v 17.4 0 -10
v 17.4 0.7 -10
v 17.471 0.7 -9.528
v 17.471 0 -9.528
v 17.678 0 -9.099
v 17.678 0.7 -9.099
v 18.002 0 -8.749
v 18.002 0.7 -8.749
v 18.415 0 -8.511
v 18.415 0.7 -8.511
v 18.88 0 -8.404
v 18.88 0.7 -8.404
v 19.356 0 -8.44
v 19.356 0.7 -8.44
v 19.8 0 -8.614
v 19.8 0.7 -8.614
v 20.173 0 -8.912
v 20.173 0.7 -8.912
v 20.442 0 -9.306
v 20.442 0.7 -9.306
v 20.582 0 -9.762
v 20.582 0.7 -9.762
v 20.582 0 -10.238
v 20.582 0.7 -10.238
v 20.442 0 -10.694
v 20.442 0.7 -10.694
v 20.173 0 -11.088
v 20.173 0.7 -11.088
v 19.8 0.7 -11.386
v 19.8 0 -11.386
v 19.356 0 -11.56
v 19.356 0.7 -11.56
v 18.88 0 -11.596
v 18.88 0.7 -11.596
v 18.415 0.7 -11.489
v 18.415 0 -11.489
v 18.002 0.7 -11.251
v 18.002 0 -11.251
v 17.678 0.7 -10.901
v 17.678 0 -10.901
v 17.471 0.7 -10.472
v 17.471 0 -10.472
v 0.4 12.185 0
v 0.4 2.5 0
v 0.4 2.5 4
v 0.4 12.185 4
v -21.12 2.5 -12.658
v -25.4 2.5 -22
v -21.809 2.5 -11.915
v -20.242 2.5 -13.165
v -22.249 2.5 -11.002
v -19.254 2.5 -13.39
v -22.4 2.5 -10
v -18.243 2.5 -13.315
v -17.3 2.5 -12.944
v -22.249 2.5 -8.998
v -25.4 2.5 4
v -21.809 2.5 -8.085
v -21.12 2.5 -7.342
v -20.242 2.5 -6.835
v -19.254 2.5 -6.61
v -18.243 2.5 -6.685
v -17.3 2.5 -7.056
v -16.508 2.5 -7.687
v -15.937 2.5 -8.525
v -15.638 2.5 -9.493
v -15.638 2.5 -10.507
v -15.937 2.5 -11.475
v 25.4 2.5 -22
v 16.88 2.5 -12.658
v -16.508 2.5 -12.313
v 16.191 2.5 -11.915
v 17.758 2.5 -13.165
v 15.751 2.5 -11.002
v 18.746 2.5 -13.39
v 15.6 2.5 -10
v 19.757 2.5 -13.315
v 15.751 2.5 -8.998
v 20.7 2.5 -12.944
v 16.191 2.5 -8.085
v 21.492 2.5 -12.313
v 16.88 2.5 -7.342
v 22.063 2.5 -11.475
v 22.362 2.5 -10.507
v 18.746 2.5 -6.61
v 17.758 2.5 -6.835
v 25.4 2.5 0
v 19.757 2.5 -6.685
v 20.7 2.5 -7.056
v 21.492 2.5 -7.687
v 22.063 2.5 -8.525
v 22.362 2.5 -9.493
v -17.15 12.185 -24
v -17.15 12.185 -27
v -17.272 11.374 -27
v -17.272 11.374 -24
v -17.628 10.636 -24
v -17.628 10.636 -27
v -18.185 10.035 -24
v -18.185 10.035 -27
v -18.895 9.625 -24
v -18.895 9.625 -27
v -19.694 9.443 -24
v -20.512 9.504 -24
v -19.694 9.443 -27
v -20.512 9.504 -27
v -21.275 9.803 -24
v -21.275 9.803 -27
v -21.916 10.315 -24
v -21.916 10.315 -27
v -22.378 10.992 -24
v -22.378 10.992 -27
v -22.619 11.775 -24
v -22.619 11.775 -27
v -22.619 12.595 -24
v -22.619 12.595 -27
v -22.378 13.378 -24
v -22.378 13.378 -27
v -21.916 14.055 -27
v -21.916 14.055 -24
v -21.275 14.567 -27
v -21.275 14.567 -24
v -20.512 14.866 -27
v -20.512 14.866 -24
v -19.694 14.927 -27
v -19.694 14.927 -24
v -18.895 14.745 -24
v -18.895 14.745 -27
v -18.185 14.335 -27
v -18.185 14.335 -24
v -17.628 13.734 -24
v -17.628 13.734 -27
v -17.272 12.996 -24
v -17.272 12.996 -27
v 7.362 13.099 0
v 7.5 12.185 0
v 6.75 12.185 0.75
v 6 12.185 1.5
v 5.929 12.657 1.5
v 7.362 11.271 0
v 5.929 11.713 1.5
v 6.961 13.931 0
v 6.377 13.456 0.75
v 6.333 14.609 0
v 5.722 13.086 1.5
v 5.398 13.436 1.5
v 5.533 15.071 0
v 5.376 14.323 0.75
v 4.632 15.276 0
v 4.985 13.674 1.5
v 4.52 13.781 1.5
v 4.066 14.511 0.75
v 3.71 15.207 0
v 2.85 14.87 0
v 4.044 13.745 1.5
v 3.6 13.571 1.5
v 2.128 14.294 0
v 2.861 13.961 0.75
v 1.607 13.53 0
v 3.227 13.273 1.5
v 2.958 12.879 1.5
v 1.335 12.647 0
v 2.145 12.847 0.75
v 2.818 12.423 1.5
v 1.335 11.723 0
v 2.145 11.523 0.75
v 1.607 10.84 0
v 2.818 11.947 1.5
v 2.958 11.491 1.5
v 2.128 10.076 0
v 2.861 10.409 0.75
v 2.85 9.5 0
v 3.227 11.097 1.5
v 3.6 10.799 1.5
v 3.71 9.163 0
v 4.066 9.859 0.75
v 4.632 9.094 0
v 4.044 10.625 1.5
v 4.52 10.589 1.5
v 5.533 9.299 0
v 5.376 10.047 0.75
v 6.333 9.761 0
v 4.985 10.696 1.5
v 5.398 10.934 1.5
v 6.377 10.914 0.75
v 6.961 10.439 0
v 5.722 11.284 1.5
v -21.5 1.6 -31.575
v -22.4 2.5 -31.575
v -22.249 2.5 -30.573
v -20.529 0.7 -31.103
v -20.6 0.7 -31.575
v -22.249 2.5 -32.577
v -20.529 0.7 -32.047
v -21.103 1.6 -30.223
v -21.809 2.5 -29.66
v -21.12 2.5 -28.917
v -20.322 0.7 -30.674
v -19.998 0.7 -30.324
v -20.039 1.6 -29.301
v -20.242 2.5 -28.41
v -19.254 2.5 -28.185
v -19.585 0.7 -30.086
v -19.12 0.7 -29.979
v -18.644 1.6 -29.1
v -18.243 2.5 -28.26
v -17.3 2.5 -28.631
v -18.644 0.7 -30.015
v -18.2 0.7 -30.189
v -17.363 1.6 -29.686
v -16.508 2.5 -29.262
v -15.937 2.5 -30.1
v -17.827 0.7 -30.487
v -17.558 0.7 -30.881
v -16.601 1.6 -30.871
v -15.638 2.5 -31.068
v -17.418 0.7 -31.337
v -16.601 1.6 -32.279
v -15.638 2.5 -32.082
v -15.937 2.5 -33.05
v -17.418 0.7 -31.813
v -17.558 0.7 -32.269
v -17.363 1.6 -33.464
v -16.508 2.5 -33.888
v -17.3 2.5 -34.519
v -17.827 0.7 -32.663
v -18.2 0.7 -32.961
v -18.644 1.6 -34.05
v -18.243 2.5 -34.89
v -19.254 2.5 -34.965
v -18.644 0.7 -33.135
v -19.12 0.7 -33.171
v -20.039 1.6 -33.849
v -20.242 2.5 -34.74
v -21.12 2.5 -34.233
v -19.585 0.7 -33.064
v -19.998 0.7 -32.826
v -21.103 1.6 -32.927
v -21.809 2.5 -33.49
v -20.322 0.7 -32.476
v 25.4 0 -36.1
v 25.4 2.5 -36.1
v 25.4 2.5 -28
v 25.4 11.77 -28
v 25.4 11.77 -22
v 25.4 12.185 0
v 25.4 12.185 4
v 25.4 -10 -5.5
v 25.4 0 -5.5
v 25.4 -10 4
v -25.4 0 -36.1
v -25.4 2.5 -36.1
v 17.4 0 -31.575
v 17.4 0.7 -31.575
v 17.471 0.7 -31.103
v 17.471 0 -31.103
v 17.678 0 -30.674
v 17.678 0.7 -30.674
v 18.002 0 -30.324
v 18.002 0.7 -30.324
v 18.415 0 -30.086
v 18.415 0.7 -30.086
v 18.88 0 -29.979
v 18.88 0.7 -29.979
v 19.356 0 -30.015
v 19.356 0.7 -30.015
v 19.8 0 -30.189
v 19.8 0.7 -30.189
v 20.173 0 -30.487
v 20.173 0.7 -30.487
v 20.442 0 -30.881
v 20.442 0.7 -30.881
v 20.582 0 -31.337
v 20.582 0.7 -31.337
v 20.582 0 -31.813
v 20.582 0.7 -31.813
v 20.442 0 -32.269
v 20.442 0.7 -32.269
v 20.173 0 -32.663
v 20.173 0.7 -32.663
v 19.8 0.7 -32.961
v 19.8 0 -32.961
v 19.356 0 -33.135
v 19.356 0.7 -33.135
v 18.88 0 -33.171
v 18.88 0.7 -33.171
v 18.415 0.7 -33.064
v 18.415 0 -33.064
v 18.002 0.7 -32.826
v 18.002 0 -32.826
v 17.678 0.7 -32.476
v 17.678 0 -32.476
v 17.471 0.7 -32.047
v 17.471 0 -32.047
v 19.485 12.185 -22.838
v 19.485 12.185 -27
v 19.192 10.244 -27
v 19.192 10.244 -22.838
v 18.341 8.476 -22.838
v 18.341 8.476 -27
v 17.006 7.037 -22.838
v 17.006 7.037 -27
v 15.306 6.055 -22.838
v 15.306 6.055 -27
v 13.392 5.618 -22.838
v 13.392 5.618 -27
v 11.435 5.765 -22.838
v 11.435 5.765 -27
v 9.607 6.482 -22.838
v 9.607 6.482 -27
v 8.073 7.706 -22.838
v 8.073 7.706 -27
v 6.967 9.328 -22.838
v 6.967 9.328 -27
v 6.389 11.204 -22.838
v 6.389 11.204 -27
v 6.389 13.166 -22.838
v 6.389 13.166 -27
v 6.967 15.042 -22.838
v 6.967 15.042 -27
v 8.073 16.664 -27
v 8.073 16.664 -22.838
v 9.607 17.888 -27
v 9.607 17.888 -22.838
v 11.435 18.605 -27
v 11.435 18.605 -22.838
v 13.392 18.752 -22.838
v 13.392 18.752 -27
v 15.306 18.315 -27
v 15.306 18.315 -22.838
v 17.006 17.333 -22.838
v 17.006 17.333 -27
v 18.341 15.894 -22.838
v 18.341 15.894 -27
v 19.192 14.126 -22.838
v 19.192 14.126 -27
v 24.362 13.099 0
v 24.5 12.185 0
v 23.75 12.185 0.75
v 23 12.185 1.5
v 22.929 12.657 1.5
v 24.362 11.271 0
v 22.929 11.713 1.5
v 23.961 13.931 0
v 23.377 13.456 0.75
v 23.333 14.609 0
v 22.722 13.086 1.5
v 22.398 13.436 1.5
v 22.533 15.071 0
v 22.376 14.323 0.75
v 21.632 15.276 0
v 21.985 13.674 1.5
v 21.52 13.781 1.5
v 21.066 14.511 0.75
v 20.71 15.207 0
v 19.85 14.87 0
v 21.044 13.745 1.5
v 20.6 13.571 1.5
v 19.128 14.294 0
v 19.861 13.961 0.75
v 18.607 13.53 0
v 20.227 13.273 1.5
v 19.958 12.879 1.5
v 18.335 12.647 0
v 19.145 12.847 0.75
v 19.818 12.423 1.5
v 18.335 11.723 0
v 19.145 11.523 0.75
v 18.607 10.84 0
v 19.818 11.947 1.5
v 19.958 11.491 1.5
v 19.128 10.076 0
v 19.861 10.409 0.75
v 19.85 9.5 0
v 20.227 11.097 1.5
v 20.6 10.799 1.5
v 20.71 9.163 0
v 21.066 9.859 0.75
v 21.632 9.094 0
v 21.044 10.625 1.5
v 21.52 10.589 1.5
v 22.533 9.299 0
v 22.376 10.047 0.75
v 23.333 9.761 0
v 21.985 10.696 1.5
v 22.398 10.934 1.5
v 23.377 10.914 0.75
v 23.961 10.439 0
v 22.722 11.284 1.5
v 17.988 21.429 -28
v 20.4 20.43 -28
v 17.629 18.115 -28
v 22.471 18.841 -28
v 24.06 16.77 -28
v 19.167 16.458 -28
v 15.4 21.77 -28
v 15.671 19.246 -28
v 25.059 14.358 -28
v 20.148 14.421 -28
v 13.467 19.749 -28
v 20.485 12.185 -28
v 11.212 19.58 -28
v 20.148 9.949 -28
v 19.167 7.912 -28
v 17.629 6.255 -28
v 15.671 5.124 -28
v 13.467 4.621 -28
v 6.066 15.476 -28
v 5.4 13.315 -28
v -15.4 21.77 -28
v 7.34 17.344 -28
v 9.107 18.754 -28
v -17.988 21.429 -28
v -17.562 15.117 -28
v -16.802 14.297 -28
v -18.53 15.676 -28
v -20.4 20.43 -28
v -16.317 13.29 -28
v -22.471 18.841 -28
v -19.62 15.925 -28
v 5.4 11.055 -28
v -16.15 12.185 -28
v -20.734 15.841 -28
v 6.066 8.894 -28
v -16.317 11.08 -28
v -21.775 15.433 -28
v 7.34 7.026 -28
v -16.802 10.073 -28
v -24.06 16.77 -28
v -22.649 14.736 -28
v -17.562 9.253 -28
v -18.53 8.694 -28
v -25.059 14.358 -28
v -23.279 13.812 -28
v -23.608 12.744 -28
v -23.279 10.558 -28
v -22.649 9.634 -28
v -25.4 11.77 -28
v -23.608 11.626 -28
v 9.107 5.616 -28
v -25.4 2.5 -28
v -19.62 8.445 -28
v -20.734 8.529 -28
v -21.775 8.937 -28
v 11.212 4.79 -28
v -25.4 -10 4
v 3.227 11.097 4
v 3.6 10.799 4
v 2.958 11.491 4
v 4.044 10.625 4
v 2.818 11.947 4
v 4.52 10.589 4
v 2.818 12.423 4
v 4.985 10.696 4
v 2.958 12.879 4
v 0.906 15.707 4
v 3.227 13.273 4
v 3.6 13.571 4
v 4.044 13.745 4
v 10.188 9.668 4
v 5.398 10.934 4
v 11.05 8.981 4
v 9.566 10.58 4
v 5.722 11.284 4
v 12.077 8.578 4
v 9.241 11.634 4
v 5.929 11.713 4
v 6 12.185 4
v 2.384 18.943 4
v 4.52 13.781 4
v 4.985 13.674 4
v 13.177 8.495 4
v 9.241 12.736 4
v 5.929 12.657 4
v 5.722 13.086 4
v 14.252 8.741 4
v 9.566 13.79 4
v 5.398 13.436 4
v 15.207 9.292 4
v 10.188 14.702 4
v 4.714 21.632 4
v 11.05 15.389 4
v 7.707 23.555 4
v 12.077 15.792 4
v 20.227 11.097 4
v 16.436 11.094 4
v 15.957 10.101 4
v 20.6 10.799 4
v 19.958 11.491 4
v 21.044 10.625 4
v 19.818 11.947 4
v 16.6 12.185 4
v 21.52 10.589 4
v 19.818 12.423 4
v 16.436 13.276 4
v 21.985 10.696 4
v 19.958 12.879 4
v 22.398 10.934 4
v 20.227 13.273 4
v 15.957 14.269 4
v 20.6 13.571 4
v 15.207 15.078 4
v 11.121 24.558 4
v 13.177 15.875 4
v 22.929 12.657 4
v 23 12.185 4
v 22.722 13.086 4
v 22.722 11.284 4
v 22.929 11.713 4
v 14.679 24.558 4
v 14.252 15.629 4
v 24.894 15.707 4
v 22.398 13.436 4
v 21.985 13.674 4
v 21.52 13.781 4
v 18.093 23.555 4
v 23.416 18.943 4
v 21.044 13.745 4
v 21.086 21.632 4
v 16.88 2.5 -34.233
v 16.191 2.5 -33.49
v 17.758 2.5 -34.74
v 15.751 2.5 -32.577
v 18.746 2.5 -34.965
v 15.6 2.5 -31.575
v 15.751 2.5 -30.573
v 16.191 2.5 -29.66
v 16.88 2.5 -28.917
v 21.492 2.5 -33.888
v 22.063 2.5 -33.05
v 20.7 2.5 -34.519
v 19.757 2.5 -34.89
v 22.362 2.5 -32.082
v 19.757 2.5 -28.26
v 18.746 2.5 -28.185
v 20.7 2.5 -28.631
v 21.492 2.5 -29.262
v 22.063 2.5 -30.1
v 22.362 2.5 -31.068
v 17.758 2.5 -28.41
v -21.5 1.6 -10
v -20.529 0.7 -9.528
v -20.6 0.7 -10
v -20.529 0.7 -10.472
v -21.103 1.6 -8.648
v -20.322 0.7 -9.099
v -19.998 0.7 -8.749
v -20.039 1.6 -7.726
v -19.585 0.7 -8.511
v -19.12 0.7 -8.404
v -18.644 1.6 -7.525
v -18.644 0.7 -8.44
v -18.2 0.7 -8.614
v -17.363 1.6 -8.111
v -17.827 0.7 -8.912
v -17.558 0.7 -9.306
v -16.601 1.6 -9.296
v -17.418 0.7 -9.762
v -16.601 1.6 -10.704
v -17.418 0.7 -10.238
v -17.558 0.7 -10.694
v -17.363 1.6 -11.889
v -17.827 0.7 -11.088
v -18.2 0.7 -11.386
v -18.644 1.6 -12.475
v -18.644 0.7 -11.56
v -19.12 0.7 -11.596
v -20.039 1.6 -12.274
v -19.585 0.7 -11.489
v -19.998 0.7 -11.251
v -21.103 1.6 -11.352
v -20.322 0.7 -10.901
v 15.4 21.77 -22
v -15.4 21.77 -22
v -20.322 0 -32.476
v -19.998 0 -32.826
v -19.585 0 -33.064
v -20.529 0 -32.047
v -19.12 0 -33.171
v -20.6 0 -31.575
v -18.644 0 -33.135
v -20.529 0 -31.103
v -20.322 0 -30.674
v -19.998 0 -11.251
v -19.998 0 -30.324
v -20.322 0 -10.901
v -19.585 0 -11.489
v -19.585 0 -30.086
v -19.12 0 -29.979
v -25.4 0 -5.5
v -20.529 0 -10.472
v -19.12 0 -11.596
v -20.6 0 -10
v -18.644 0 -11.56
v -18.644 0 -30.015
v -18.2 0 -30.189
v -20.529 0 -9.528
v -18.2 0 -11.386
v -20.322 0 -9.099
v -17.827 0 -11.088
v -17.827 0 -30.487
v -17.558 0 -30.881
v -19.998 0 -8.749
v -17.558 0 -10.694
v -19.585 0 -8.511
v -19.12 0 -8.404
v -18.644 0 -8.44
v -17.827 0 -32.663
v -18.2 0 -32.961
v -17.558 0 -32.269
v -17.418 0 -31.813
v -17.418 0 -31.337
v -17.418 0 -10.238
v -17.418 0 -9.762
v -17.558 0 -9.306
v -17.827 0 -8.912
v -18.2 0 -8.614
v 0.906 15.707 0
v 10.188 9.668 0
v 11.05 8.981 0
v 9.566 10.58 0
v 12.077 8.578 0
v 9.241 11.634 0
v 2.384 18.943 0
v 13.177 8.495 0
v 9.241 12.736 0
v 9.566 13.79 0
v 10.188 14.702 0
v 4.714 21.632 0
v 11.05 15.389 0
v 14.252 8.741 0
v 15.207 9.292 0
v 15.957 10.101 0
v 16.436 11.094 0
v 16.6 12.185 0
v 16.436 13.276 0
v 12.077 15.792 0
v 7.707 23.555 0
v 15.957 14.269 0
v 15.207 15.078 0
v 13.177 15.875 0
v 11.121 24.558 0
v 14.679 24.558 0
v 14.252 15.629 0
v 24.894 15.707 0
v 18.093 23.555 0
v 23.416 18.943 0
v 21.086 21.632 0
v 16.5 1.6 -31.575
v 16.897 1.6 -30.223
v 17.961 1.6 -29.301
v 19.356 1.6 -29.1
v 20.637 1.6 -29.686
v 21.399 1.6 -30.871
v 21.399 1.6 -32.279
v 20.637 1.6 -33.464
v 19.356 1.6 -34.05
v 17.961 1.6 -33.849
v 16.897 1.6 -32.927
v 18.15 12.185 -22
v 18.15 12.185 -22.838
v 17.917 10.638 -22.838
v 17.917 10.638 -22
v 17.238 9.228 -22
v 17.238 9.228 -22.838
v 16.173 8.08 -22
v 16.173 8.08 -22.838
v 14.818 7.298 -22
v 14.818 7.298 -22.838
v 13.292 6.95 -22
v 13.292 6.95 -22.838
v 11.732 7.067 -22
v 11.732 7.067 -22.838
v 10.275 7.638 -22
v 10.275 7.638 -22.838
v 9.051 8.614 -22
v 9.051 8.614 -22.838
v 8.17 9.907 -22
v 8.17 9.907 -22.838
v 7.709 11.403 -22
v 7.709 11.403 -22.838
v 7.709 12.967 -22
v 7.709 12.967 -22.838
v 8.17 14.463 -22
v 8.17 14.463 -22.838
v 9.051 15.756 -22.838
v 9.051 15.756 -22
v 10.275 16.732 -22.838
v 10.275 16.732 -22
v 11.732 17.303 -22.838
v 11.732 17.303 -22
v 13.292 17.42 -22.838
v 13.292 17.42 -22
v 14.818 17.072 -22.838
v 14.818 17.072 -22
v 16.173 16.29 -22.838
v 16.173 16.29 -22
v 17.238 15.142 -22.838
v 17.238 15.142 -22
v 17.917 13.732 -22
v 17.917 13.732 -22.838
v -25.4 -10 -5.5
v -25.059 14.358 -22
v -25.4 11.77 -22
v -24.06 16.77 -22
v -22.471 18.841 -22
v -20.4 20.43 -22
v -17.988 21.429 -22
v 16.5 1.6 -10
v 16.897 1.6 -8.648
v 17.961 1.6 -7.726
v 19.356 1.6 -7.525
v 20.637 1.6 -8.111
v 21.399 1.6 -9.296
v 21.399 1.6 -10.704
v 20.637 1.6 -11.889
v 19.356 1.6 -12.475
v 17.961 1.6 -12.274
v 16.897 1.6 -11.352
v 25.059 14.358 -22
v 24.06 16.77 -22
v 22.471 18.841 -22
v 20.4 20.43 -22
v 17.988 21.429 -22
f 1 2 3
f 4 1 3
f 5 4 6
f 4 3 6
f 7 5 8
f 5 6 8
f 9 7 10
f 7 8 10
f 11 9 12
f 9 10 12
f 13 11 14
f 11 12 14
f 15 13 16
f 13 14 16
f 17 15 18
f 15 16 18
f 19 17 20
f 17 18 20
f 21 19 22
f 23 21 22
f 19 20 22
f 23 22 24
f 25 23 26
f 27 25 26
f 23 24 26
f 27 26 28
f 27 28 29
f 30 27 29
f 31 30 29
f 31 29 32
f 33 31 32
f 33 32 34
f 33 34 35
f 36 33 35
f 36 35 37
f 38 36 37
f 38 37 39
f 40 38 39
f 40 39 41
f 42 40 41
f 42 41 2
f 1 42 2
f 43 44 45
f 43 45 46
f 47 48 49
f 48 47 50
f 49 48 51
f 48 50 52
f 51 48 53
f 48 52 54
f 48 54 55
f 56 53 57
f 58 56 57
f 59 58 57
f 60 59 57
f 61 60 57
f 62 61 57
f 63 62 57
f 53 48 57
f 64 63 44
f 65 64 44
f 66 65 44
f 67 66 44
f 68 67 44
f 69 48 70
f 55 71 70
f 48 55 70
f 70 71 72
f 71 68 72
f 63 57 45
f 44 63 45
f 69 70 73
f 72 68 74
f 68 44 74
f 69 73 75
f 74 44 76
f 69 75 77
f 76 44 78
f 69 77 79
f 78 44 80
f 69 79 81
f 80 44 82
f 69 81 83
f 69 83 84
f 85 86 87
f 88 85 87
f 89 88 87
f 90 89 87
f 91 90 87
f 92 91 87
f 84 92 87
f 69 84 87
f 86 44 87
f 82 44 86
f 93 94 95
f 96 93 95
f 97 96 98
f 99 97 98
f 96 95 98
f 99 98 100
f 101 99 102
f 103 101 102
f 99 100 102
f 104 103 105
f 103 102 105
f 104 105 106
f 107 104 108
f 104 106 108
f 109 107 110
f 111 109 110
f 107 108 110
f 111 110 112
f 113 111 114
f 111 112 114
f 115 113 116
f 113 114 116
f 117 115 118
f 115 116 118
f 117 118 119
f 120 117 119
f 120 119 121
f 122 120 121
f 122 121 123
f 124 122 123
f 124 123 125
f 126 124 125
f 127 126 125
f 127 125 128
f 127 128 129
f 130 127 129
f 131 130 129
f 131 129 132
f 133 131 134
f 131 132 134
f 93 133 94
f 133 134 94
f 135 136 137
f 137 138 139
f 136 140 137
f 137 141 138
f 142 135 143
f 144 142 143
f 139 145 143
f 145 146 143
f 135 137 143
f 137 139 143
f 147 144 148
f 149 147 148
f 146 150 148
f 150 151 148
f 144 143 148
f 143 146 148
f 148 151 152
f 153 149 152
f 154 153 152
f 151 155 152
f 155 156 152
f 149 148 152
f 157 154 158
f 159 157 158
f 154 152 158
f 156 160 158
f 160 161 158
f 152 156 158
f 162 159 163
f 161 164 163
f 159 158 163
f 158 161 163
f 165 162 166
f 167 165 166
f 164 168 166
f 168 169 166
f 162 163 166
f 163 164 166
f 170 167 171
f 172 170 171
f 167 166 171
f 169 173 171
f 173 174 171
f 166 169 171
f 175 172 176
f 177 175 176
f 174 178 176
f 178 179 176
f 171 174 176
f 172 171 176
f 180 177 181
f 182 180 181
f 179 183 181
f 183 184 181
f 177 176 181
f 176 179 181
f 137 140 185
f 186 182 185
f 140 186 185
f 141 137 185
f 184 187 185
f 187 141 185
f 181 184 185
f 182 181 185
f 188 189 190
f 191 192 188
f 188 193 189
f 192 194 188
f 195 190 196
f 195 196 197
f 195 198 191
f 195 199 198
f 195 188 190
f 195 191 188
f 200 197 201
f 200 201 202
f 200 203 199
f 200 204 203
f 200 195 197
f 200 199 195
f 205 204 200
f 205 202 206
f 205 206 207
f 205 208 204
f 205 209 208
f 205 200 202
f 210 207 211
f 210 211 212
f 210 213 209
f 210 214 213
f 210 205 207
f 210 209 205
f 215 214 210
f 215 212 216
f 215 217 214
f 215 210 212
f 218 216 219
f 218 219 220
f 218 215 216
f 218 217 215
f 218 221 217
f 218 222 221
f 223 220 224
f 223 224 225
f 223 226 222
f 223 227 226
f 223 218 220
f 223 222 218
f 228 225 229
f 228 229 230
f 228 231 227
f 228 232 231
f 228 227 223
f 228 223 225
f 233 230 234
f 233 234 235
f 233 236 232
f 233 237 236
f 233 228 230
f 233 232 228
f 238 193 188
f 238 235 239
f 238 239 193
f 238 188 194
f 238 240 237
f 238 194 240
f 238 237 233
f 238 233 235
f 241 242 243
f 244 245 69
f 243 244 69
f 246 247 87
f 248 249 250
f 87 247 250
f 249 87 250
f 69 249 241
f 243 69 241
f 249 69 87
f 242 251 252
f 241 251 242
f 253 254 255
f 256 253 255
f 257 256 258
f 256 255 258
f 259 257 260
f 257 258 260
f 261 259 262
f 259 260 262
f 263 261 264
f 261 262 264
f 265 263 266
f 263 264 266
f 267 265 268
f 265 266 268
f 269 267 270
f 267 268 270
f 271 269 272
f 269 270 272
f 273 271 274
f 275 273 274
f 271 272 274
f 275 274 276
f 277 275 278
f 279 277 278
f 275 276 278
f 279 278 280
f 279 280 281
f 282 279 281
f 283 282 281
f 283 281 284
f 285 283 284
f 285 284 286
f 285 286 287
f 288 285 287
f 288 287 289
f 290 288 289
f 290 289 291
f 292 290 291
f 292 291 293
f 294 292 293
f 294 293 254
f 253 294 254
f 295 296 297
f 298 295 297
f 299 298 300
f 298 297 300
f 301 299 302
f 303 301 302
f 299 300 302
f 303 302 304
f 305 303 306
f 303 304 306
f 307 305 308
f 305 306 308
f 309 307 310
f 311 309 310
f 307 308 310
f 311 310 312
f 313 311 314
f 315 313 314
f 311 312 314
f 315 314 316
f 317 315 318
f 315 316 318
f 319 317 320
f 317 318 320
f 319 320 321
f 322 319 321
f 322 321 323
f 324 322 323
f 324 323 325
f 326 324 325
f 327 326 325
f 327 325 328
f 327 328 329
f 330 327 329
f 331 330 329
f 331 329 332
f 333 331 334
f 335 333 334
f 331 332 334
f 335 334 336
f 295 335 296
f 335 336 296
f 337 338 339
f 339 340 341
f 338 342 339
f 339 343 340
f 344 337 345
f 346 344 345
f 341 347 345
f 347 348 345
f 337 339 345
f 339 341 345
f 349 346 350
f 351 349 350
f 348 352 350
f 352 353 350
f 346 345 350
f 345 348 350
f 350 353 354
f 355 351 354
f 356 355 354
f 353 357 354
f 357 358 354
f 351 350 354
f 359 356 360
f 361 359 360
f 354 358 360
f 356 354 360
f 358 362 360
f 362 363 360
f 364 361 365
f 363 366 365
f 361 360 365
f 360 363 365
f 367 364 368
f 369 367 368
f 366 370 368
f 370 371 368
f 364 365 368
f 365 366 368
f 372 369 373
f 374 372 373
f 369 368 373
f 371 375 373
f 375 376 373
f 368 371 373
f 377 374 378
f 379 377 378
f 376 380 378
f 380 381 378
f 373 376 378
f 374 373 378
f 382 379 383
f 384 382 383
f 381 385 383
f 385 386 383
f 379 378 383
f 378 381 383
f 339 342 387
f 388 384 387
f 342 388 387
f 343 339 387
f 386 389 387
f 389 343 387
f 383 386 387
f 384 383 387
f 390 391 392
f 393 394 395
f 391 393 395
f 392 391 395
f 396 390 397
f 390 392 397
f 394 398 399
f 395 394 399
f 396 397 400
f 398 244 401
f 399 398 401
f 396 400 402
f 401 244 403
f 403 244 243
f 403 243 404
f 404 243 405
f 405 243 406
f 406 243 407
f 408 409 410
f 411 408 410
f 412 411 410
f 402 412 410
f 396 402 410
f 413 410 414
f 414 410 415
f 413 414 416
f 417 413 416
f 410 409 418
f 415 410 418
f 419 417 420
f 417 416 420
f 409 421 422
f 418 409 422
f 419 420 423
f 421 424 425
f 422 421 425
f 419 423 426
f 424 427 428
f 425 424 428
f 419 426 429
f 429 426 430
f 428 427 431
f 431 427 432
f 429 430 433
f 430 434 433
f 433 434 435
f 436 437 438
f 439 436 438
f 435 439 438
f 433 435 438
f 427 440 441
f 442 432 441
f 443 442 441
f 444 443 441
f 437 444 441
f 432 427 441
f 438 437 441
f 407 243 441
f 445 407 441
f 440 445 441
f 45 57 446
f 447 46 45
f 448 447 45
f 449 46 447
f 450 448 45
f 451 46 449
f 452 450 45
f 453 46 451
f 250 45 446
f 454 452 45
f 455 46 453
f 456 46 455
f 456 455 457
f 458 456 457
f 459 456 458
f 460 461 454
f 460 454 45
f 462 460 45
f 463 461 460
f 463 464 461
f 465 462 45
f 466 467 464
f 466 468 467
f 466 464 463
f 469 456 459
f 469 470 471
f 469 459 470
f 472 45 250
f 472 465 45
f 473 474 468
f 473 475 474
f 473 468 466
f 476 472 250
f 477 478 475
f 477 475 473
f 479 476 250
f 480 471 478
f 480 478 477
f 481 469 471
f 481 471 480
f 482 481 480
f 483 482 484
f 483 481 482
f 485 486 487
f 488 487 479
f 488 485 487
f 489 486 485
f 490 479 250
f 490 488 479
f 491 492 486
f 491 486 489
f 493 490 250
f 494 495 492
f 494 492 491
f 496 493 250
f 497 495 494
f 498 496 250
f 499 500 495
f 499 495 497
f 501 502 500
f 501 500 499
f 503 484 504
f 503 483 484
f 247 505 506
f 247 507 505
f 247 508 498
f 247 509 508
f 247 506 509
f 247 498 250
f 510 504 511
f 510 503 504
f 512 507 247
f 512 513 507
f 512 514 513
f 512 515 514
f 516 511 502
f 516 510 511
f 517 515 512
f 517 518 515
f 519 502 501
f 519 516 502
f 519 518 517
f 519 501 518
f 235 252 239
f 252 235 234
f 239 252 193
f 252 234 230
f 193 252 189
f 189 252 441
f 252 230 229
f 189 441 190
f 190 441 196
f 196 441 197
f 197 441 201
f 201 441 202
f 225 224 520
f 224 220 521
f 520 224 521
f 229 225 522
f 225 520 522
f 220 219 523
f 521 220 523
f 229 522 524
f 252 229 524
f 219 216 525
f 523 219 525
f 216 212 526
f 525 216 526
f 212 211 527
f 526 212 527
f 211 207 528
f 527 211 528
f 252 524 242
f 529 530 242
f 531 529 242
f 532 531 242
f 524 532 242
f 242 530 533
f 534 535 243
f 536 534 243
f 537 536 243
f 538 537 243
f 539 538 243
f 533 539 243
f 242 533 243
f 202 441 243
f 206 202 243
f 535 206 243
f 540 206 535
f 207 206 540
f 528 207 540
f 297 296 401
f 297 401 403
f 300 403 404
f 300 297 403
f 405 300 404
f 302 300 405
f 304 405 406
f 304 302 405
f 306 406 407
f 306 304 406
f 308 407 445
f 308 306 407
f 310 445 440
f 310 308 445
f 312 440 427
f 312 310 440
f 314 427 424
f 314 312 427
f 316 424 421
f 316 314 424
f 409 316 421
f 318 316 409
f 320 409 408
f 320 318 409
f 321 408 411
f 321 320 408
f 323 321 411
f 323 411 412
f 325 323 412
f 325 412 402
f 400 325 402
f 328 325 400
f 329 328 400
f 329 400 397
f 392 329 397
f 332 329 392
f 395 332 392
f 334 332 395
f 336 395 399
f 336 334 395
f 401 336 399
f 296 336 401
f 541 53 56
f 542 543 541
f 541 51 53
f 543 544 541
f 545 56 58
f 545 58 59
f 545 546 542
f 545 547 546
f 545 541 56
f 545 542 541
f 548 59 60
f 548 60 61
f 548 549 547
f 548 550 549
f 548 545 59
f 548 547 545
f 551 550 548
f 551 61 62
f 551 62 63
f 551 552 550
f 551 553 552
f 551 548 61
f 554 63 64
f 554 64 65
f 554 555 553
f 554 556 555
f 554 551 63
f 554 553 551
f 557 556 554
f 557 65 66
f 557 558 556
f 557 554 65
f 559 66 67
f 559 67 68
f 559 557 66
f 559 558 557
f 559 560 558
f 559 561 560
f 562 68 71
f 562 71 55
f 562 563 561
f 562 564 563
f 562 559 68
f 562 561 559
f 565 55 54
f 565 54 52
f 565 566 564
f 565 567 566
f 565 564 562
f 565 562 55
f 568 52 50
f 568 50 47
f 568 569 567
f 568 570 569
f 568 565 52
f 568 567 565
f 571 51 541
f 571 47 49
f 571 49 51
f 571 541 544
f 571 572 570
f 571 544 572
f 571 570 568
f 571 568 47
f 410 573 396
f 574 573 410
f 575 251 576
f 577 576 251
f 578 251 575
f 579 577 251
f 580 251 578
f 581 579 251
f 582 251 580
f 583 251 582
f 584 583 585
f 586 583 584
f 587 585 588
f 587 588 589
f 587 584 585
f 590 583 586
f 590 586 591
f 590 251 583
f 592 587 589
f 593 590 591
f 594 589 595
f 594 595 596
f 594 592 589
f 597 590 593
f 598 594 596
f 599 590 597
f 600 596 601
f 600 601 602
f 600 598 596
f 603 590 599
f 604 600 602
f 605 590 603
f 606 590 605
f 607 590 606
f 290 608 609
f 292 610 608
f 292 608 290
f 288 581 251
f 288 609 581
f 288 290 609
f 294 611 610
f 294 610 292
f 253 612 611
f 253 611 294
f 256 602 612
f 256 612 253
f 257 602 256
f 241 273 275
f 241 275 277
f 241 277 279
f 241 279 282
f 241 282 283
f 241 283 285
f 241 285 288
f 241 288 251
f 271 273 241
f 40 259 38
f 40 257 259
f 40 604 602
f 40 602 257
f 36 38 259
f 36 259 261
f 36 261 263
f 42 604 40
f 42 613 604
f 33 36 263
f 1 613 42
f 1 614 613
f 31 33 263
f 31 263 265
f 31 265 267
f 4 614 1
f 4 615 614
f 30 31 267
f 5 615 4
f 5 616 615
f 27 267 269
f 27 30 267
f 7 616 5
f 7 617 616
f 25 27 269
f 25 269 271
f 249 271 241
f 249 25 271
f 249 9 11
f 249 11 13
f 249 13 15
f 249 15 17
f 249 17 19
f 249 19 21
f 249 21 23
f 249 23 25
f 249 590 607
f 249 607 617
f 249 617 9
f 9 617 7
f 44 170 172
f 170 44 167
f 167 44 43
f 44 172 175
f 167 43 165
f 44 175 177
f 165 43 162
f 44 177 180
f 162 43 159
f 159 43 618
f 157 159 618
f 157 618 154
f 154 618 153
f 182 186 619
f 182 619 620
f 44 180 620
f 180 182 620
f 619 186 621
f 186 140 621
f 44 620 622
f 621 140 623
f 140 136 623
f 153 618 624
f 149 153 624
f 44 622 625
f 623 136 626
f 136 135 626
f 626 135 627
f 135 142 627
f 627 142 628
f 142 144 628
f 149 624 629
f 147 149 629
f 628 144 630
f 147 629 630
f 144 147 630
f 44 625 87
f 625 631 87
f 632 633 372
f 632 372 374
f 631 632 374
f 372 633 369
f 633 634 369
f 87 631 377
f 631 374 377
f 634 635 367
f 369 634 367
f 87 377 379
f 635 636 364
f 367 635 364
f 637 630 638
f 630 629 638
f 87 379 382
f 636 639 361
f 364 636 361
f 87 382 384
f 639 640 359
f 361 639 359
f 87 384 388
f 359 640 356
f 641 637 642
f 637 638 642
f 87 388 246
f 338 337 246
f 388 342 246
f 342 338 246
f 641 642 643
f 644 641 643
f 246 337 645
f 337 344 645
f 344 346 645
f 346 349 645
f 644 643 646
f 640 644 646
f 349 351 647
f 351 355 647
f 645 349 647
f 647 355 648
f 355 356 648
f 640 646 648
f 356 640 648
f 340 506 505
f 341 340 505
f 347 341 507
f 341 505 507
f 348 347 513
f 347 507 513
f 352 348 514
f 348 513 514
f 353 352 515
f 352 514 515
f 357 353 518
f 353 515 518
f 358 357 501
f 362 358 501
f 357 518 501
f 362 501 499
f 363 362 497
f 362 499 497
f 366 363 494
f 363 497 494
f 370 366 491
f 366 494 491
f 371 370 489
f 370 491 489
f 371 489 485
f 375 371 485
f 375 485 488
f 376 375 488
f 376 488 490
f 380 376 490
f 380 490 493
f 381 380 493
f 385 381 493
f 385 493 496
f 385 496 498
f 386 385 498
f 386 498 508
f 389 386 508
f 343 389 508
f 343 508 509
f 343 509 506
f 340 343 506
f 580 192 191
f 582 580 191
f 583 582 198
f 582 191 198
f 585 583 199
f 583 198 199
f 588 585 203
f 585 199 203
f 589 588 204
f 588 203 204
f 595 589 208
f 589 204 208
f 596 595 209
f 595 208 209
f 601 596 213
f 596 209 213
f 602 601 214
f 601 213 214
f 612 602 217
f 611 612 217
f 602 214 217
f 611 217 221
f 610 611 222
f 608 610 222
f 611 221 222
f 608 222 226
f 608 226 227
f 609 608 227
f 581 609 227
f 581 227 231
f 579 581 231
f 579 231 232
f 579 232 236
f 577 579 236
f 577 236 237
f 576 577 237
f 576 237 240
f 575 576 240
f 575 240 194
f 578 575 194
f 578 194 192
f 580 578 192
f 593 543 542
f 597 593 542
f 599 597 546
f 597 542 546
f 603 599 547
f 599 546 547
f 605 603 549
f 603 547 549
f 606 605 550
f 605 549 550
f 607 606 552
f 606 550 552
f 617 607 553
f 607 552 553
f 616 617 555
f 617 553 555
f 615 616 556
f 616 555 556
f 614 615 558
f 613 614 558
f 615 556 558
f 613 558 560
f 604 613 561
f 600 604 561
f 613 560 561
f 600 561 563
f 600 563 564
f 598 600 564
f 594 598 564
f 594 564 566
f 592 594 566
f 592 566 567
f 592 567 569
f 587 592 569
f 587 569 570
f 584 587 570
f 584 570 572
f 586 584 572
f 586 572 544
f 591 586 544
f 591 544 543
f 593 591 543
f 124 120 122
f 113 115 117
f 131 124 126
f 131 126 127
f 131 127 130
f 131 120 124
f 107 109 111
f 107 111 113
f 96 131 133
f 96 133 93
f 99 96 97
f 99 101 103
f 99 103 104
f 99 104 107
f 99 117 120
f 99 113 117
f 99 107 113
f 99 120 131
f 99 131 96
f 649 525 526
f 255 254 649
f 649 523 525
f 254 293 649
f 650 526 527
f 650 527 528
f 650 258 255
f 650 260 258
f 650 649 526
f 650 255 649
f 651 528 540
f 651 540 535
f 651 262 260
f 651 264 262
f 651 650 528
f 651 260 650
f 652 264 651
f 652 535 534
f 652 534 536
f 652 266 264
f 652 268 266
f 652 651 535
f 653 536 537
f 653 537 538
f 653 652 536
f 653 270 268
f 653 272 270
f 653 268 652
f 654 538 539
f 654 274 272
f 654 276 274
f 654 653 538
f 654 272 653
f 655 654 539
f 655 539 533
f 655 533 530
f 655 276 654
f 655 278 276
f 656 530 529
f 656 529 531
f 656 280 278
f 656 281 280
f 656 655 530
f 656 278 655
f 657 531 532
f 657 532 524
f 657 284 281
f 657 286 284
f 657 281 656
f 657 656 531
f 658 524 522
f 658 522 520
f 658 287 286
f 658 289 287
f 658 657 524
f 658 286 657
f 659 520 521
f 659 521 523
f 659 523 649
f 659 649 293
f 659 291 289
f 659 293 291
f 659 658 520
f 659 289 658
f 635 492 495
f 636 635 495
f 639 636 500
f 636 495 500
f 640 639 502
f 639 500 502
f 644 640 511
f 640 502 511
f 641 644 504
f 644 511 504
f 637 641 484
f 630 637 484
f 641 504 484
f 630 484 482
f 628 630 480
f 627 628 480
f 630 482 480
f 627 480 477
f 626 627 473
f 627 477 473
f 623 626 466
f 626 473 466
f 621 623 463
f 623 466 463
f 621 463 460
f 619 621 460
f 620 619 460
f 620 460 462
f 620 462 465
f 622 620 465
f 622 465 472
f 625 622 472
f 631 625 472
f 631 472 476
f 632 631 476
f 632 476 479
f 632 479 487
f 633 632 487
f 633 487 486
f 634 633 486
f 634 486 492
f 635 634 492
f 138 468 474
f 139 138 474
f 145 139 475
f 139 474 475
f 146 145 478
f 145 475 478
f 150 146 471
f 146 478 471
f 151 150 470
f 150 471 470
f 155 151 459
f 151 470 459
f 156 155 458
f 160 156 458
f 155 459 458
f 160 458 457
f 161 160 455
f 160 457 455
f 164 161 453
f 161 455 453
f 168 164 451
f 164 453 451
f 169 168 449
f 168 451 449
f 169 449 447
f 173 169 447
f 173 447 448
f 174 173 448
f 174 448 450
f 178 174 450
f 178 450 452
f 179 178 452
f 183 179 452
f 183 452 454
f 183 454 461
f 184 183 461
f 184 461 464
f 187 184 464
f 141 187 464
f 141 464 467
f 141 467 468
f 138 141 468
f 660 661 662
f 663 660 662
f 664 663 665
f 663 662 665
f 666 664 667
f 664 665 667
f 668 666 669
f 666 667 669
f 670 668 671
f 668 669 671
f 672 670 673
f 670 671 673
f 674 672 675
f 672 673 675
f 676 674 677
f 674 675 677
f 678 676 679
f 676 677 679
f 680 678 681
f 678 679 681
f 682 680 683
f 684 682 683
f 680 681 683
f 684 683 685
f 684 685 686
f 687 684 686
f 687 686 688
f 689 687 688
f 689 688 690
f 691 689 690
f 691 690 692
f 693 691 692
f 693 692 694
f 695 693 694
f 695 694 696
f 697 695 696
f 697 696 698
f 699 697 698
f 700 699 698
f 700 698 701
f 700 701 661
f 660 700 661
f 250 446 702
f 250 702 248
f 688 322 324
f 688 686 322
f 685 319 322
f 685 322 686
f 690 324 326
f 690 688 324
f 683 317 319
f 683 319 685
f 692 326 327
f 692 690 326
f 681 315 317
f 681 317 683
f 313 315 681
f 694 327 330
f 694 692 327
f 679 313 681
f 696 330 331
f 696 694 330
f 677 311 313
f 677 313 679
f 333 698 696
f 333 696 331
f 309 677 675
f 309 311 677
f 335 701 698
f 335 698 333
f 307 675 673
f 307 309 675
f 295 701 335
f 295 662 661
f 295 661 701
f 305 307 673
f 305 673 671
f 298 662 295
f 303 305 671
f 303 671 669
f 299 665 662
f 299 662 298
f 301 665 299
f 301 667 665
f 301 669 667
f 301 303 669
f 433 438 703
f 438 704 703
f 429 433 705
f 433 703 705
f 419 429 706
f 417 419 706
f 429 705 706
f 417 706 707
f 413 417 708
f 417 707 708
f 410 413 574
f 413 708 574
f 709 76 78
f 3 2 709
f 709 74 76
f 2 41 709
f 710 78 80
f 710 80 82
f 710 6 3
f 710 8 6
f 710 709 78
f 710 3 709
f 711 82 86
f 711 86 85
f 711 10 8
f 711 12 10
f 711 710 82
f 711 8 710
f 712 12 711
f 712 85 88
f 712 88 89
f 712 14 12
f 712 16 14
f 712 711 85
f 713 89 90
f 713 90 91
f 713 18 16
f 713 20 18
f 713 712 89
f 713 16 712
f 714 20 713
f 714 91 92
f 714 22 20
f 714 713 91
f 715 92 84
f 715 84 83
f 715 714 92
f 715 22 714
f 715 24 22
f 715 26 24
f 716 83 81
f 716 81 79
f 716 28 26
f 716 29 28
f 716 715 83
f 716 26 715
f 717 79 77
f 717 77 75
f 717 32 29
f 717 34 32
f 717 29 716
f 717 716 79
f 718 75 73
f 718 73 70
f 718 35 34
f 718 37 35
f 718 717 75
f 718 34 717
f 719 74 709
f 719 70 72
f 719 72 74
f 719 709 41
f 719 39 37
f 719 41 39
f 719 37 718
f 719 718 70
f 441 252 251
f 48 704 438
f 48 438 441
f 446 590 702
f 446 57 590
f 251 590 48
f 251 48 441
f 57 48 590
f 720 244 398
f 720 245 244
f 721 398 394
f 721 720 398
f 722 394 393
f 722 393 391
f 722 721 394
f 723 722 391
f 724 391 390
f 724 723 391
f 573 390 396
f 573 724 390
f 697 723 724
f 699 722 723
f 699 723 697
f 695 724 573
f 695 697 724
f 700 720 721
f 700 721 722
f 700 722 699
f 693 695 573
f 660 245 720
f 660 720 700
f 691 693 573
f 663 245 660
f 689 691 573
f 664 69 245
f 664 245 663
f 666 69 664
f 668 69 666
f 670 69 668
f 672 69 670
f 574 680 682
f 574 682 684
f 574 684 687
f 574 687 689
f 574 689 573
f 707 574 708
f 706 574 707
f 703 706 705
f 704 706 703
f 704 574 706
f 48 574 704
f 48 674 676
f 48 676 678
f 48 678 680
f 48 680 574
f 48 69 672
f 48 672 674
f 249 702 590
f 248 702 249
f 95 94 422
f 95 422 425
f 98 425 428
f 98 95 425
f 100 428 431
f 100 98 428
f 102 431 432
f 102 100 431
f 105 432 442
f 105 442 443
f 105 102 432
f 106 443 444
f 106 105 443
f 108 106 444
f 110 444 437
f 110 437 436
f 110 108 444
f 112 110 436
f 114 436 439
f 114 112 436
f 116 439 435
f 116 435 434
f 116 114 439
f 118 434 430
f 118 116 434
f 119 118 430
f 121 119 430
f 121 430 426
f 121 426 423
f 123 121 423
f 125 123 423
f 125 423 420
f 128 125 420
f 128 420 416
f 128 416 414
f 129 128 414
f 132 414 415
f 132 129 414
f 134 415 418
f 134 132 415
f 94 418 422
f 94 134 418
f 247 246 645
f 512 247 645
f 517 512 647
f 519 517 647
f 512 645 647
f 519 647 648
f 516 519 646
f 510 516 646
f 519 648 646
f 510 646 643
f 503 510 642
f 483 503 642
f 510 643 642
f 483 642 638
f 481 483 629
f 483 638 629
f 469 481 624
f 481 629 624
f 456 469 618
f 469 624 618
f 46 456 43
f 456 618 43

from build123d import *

# Parameters (mm, degrees)
PAD016_DEPTH    = 4
SKETCH074_W     = 50.8
SKETCH074_H     = 2.5
PAD017_DEPTH    = 36.1
SKETCH082_W     = 50.8
SKETCH082_H     = 10
PAD018_DEPTH    = 5.5
SKETCH075_R     = 3.7
POCKET065_DEPTH = 5
SKETCH076_R     = 1.6
POCKET066_DEPTH = 5
SKETCH077_W     = 50.8
SKETCH077_H     = 6
PAD019_DEPTH    = 19.27
SKETCH078_R     = 6.585
POCKET067_DEPTH = 5.1625
SKETCH079_R     = 5.25
POCKET068_DEPTH = 5
SKETCH080_R     = 2.75
POCKET069_DEPTH = 4
SKETCH081_R     = 1.6
POCKET070_DEPTH = 5
CHAMFER010_SIZE = 1.8
CHAMFER011_SIZE = 1
CHAMFER012_SIZE = 1.5
FILLET001_R     = 10


with BuildPart() as part:
    # Sketch073 → Pad016 (new body)
    with BuildSketch(Plane.XY):
        with BuildLine():
            Line((-25.4, 2.5), (-25.4, -10))
            Line((-25.4, -10), (25.4, -10))
            Line((25.4, -10), (25.4, 2.5))
            Line((25.4, 2.5), (25.4, 12.185))
            ThreePointArc((25.4, 12.185), (12.9, 24.685), (0.4, 12.185))
            Line((0.4, 2.5), (0.4, 12.185))
            Line((0.4, 2.5), (-25.4, 2.5))
        make_face()
    extrude(amount=PAD016_DEPTH)

    # Sketch074 (on Face8 of Pad016) → Pad017 (join)
    with BuildSketch(Plane(origin=(0, 0, 0), x_dir=(1, 0, 0), z_dir=(0, 0, -1))):
        with Locations((0, -1.25)):
            Rectangle(SKETCH074_W, SKETCH074_H)
    extrude(amount=PAD017_DEPTH)

    # Sketch082 (on Face5 of Pad017) → Pad018 (join)
    with BuildSketch(Plane(origin=(0, 0, 0), x_dir=(1, 0, 0), z_dir=(0, 0, -1))):
        with Locations((0, 5)):
            Rectangle(SKETCH082_W, SKETCH082_H)
    extrude(amount=PAD018_DEPTH)

    # Sketch075 → Pocket065 (cut)
    with BuildSketch(Plane.XY.offset(4)):
        with Locations((12.9, 12.185)):
            Circle(SKETCH075_R)
    extrude(amount=-POCKET065_DEPTH, mode=Mode.SUBTRACT)

    # Sketch076 → Pocket066 (cut)
    with BuildSketch(Plane(origin=(0, 2.5, 0), x_dir=(-1, 0, 0), z_dir=(0, 1, 0))):
        with Locations((-19, -10)):
            Circle(SKETCH076_R)
        with Locations((19, -10)):
            Circle(SKETCH076_R)
        with Locations((19, -31.575)):
            Circle(SKETCH076_R)
        with Locations((-19, -31.575)):
            Circle(SKETCH076_R)
    extrude(amount=-POCKET066_DEPTH, mode=Mode.SUBTRACT)

    # Sketch077 → Pad019 (join)
    with BuildSketch(Plane(origin=(0, 2.5, 0), x_dir=(-1, 0, 0), z_dir=(0, 1, 0))):
        with Locations((0, -25)):
            Rectangle(SKETCH077_W, SKETCH077_H)
    extrude(amount=PAD019_DEPTH)

    # Sketch078 (on Face27 of Pad019) → Pocket067 (cut)
    with BuildSketch(Plane(origin=(0, 0, -28), x_dir=(1, 0, 0), z_dir=(0, 0, -1))):
        with Locations((12.9, -12.185)):
            Circle(SKETCH078_R)
    extrude(amount=-POCKET067_DEPTH, mode=Mode.SUBTRACT)

    # Sketch079 (on Face31 of Pocket067) → Pocket068 (cut)
    with BuildSketch(Plane(origin=(0, 0, -22.8375), x_dir=(1, 0, 0), z_dir=(0, 0, -1))):
        with Locations((12.9, -12.185)):
            Circle(SKETCH079_R)
    extrude(amount=-POCKET068_DEPTH, mode=Mode.SUBTRACT)

    # Sketch080 (on Face27 of Pocket068) → Pocket069 (cut)
    with BuildSketch(Plane(origin=(0, 0, -28), x_dir=(1, 0, 0), z_dir=(0, 0, -1))):
        with Locations((-19.9, -12.185)):
            Circle(SKETCH080_R)
    extrude(amount=-POCKET069_DEPTH, mode=Mode.SUBTRACT)

    # Sketch081 → Pocket070 (cut)
    with BuildSketch(Plane.XY.offset(4)):
        with Locations((4.4, 12.185)):
            Circle(SKETCH081_R)
        with Locations((21.4, 12.185)):
            Circle(SKETCH081_R)
    extrude(amount=-POCKET070_DEPTH, mode=Mode.SUBTRACT)

    # Chamfer010
    chamfer010_edges = [part.edges().sort_by_distance(p)[0] for p in [
        (20.6, 2.5, -31.575),
        (-17.4, 2.5, -31.575),
        (20.6, 2.5, -10),
        (-17.4, 2.5, -10),
    ]]
    chamfer(chamfer010_edges, length=CHAMFER010_SIZE)

    # Chamfer011
    chamfer011_edges = [part.edges().sort_by_distance(p)[0] for p in [
        (6.315, 12.185, -28),
        (-22.65, 12.185, -28),
    ]]
    chamfer(chamfer011_edges, length=CHAMFER011_SIZE)

    # Chamfer012
    chamfer012_edges = [part.edges().sort_by_distance(p)[0] for p in [
        (19.8, 12.185, 0),
        (2.8, 12.185, 0),
    ]]
    chamfer(chamfer012_edges, length=CHAMFER012_SIZE)

    # Fillet001
    fillet001_edges = [part.edges().sort_by_distance(p)[0] for p in [
        (25.4, 21.77, -25),
        (-25.4, 21.77, -25),
    ]]
    fillet(fillet001_edges, radius=FILLET001_R)


solid = part.part
